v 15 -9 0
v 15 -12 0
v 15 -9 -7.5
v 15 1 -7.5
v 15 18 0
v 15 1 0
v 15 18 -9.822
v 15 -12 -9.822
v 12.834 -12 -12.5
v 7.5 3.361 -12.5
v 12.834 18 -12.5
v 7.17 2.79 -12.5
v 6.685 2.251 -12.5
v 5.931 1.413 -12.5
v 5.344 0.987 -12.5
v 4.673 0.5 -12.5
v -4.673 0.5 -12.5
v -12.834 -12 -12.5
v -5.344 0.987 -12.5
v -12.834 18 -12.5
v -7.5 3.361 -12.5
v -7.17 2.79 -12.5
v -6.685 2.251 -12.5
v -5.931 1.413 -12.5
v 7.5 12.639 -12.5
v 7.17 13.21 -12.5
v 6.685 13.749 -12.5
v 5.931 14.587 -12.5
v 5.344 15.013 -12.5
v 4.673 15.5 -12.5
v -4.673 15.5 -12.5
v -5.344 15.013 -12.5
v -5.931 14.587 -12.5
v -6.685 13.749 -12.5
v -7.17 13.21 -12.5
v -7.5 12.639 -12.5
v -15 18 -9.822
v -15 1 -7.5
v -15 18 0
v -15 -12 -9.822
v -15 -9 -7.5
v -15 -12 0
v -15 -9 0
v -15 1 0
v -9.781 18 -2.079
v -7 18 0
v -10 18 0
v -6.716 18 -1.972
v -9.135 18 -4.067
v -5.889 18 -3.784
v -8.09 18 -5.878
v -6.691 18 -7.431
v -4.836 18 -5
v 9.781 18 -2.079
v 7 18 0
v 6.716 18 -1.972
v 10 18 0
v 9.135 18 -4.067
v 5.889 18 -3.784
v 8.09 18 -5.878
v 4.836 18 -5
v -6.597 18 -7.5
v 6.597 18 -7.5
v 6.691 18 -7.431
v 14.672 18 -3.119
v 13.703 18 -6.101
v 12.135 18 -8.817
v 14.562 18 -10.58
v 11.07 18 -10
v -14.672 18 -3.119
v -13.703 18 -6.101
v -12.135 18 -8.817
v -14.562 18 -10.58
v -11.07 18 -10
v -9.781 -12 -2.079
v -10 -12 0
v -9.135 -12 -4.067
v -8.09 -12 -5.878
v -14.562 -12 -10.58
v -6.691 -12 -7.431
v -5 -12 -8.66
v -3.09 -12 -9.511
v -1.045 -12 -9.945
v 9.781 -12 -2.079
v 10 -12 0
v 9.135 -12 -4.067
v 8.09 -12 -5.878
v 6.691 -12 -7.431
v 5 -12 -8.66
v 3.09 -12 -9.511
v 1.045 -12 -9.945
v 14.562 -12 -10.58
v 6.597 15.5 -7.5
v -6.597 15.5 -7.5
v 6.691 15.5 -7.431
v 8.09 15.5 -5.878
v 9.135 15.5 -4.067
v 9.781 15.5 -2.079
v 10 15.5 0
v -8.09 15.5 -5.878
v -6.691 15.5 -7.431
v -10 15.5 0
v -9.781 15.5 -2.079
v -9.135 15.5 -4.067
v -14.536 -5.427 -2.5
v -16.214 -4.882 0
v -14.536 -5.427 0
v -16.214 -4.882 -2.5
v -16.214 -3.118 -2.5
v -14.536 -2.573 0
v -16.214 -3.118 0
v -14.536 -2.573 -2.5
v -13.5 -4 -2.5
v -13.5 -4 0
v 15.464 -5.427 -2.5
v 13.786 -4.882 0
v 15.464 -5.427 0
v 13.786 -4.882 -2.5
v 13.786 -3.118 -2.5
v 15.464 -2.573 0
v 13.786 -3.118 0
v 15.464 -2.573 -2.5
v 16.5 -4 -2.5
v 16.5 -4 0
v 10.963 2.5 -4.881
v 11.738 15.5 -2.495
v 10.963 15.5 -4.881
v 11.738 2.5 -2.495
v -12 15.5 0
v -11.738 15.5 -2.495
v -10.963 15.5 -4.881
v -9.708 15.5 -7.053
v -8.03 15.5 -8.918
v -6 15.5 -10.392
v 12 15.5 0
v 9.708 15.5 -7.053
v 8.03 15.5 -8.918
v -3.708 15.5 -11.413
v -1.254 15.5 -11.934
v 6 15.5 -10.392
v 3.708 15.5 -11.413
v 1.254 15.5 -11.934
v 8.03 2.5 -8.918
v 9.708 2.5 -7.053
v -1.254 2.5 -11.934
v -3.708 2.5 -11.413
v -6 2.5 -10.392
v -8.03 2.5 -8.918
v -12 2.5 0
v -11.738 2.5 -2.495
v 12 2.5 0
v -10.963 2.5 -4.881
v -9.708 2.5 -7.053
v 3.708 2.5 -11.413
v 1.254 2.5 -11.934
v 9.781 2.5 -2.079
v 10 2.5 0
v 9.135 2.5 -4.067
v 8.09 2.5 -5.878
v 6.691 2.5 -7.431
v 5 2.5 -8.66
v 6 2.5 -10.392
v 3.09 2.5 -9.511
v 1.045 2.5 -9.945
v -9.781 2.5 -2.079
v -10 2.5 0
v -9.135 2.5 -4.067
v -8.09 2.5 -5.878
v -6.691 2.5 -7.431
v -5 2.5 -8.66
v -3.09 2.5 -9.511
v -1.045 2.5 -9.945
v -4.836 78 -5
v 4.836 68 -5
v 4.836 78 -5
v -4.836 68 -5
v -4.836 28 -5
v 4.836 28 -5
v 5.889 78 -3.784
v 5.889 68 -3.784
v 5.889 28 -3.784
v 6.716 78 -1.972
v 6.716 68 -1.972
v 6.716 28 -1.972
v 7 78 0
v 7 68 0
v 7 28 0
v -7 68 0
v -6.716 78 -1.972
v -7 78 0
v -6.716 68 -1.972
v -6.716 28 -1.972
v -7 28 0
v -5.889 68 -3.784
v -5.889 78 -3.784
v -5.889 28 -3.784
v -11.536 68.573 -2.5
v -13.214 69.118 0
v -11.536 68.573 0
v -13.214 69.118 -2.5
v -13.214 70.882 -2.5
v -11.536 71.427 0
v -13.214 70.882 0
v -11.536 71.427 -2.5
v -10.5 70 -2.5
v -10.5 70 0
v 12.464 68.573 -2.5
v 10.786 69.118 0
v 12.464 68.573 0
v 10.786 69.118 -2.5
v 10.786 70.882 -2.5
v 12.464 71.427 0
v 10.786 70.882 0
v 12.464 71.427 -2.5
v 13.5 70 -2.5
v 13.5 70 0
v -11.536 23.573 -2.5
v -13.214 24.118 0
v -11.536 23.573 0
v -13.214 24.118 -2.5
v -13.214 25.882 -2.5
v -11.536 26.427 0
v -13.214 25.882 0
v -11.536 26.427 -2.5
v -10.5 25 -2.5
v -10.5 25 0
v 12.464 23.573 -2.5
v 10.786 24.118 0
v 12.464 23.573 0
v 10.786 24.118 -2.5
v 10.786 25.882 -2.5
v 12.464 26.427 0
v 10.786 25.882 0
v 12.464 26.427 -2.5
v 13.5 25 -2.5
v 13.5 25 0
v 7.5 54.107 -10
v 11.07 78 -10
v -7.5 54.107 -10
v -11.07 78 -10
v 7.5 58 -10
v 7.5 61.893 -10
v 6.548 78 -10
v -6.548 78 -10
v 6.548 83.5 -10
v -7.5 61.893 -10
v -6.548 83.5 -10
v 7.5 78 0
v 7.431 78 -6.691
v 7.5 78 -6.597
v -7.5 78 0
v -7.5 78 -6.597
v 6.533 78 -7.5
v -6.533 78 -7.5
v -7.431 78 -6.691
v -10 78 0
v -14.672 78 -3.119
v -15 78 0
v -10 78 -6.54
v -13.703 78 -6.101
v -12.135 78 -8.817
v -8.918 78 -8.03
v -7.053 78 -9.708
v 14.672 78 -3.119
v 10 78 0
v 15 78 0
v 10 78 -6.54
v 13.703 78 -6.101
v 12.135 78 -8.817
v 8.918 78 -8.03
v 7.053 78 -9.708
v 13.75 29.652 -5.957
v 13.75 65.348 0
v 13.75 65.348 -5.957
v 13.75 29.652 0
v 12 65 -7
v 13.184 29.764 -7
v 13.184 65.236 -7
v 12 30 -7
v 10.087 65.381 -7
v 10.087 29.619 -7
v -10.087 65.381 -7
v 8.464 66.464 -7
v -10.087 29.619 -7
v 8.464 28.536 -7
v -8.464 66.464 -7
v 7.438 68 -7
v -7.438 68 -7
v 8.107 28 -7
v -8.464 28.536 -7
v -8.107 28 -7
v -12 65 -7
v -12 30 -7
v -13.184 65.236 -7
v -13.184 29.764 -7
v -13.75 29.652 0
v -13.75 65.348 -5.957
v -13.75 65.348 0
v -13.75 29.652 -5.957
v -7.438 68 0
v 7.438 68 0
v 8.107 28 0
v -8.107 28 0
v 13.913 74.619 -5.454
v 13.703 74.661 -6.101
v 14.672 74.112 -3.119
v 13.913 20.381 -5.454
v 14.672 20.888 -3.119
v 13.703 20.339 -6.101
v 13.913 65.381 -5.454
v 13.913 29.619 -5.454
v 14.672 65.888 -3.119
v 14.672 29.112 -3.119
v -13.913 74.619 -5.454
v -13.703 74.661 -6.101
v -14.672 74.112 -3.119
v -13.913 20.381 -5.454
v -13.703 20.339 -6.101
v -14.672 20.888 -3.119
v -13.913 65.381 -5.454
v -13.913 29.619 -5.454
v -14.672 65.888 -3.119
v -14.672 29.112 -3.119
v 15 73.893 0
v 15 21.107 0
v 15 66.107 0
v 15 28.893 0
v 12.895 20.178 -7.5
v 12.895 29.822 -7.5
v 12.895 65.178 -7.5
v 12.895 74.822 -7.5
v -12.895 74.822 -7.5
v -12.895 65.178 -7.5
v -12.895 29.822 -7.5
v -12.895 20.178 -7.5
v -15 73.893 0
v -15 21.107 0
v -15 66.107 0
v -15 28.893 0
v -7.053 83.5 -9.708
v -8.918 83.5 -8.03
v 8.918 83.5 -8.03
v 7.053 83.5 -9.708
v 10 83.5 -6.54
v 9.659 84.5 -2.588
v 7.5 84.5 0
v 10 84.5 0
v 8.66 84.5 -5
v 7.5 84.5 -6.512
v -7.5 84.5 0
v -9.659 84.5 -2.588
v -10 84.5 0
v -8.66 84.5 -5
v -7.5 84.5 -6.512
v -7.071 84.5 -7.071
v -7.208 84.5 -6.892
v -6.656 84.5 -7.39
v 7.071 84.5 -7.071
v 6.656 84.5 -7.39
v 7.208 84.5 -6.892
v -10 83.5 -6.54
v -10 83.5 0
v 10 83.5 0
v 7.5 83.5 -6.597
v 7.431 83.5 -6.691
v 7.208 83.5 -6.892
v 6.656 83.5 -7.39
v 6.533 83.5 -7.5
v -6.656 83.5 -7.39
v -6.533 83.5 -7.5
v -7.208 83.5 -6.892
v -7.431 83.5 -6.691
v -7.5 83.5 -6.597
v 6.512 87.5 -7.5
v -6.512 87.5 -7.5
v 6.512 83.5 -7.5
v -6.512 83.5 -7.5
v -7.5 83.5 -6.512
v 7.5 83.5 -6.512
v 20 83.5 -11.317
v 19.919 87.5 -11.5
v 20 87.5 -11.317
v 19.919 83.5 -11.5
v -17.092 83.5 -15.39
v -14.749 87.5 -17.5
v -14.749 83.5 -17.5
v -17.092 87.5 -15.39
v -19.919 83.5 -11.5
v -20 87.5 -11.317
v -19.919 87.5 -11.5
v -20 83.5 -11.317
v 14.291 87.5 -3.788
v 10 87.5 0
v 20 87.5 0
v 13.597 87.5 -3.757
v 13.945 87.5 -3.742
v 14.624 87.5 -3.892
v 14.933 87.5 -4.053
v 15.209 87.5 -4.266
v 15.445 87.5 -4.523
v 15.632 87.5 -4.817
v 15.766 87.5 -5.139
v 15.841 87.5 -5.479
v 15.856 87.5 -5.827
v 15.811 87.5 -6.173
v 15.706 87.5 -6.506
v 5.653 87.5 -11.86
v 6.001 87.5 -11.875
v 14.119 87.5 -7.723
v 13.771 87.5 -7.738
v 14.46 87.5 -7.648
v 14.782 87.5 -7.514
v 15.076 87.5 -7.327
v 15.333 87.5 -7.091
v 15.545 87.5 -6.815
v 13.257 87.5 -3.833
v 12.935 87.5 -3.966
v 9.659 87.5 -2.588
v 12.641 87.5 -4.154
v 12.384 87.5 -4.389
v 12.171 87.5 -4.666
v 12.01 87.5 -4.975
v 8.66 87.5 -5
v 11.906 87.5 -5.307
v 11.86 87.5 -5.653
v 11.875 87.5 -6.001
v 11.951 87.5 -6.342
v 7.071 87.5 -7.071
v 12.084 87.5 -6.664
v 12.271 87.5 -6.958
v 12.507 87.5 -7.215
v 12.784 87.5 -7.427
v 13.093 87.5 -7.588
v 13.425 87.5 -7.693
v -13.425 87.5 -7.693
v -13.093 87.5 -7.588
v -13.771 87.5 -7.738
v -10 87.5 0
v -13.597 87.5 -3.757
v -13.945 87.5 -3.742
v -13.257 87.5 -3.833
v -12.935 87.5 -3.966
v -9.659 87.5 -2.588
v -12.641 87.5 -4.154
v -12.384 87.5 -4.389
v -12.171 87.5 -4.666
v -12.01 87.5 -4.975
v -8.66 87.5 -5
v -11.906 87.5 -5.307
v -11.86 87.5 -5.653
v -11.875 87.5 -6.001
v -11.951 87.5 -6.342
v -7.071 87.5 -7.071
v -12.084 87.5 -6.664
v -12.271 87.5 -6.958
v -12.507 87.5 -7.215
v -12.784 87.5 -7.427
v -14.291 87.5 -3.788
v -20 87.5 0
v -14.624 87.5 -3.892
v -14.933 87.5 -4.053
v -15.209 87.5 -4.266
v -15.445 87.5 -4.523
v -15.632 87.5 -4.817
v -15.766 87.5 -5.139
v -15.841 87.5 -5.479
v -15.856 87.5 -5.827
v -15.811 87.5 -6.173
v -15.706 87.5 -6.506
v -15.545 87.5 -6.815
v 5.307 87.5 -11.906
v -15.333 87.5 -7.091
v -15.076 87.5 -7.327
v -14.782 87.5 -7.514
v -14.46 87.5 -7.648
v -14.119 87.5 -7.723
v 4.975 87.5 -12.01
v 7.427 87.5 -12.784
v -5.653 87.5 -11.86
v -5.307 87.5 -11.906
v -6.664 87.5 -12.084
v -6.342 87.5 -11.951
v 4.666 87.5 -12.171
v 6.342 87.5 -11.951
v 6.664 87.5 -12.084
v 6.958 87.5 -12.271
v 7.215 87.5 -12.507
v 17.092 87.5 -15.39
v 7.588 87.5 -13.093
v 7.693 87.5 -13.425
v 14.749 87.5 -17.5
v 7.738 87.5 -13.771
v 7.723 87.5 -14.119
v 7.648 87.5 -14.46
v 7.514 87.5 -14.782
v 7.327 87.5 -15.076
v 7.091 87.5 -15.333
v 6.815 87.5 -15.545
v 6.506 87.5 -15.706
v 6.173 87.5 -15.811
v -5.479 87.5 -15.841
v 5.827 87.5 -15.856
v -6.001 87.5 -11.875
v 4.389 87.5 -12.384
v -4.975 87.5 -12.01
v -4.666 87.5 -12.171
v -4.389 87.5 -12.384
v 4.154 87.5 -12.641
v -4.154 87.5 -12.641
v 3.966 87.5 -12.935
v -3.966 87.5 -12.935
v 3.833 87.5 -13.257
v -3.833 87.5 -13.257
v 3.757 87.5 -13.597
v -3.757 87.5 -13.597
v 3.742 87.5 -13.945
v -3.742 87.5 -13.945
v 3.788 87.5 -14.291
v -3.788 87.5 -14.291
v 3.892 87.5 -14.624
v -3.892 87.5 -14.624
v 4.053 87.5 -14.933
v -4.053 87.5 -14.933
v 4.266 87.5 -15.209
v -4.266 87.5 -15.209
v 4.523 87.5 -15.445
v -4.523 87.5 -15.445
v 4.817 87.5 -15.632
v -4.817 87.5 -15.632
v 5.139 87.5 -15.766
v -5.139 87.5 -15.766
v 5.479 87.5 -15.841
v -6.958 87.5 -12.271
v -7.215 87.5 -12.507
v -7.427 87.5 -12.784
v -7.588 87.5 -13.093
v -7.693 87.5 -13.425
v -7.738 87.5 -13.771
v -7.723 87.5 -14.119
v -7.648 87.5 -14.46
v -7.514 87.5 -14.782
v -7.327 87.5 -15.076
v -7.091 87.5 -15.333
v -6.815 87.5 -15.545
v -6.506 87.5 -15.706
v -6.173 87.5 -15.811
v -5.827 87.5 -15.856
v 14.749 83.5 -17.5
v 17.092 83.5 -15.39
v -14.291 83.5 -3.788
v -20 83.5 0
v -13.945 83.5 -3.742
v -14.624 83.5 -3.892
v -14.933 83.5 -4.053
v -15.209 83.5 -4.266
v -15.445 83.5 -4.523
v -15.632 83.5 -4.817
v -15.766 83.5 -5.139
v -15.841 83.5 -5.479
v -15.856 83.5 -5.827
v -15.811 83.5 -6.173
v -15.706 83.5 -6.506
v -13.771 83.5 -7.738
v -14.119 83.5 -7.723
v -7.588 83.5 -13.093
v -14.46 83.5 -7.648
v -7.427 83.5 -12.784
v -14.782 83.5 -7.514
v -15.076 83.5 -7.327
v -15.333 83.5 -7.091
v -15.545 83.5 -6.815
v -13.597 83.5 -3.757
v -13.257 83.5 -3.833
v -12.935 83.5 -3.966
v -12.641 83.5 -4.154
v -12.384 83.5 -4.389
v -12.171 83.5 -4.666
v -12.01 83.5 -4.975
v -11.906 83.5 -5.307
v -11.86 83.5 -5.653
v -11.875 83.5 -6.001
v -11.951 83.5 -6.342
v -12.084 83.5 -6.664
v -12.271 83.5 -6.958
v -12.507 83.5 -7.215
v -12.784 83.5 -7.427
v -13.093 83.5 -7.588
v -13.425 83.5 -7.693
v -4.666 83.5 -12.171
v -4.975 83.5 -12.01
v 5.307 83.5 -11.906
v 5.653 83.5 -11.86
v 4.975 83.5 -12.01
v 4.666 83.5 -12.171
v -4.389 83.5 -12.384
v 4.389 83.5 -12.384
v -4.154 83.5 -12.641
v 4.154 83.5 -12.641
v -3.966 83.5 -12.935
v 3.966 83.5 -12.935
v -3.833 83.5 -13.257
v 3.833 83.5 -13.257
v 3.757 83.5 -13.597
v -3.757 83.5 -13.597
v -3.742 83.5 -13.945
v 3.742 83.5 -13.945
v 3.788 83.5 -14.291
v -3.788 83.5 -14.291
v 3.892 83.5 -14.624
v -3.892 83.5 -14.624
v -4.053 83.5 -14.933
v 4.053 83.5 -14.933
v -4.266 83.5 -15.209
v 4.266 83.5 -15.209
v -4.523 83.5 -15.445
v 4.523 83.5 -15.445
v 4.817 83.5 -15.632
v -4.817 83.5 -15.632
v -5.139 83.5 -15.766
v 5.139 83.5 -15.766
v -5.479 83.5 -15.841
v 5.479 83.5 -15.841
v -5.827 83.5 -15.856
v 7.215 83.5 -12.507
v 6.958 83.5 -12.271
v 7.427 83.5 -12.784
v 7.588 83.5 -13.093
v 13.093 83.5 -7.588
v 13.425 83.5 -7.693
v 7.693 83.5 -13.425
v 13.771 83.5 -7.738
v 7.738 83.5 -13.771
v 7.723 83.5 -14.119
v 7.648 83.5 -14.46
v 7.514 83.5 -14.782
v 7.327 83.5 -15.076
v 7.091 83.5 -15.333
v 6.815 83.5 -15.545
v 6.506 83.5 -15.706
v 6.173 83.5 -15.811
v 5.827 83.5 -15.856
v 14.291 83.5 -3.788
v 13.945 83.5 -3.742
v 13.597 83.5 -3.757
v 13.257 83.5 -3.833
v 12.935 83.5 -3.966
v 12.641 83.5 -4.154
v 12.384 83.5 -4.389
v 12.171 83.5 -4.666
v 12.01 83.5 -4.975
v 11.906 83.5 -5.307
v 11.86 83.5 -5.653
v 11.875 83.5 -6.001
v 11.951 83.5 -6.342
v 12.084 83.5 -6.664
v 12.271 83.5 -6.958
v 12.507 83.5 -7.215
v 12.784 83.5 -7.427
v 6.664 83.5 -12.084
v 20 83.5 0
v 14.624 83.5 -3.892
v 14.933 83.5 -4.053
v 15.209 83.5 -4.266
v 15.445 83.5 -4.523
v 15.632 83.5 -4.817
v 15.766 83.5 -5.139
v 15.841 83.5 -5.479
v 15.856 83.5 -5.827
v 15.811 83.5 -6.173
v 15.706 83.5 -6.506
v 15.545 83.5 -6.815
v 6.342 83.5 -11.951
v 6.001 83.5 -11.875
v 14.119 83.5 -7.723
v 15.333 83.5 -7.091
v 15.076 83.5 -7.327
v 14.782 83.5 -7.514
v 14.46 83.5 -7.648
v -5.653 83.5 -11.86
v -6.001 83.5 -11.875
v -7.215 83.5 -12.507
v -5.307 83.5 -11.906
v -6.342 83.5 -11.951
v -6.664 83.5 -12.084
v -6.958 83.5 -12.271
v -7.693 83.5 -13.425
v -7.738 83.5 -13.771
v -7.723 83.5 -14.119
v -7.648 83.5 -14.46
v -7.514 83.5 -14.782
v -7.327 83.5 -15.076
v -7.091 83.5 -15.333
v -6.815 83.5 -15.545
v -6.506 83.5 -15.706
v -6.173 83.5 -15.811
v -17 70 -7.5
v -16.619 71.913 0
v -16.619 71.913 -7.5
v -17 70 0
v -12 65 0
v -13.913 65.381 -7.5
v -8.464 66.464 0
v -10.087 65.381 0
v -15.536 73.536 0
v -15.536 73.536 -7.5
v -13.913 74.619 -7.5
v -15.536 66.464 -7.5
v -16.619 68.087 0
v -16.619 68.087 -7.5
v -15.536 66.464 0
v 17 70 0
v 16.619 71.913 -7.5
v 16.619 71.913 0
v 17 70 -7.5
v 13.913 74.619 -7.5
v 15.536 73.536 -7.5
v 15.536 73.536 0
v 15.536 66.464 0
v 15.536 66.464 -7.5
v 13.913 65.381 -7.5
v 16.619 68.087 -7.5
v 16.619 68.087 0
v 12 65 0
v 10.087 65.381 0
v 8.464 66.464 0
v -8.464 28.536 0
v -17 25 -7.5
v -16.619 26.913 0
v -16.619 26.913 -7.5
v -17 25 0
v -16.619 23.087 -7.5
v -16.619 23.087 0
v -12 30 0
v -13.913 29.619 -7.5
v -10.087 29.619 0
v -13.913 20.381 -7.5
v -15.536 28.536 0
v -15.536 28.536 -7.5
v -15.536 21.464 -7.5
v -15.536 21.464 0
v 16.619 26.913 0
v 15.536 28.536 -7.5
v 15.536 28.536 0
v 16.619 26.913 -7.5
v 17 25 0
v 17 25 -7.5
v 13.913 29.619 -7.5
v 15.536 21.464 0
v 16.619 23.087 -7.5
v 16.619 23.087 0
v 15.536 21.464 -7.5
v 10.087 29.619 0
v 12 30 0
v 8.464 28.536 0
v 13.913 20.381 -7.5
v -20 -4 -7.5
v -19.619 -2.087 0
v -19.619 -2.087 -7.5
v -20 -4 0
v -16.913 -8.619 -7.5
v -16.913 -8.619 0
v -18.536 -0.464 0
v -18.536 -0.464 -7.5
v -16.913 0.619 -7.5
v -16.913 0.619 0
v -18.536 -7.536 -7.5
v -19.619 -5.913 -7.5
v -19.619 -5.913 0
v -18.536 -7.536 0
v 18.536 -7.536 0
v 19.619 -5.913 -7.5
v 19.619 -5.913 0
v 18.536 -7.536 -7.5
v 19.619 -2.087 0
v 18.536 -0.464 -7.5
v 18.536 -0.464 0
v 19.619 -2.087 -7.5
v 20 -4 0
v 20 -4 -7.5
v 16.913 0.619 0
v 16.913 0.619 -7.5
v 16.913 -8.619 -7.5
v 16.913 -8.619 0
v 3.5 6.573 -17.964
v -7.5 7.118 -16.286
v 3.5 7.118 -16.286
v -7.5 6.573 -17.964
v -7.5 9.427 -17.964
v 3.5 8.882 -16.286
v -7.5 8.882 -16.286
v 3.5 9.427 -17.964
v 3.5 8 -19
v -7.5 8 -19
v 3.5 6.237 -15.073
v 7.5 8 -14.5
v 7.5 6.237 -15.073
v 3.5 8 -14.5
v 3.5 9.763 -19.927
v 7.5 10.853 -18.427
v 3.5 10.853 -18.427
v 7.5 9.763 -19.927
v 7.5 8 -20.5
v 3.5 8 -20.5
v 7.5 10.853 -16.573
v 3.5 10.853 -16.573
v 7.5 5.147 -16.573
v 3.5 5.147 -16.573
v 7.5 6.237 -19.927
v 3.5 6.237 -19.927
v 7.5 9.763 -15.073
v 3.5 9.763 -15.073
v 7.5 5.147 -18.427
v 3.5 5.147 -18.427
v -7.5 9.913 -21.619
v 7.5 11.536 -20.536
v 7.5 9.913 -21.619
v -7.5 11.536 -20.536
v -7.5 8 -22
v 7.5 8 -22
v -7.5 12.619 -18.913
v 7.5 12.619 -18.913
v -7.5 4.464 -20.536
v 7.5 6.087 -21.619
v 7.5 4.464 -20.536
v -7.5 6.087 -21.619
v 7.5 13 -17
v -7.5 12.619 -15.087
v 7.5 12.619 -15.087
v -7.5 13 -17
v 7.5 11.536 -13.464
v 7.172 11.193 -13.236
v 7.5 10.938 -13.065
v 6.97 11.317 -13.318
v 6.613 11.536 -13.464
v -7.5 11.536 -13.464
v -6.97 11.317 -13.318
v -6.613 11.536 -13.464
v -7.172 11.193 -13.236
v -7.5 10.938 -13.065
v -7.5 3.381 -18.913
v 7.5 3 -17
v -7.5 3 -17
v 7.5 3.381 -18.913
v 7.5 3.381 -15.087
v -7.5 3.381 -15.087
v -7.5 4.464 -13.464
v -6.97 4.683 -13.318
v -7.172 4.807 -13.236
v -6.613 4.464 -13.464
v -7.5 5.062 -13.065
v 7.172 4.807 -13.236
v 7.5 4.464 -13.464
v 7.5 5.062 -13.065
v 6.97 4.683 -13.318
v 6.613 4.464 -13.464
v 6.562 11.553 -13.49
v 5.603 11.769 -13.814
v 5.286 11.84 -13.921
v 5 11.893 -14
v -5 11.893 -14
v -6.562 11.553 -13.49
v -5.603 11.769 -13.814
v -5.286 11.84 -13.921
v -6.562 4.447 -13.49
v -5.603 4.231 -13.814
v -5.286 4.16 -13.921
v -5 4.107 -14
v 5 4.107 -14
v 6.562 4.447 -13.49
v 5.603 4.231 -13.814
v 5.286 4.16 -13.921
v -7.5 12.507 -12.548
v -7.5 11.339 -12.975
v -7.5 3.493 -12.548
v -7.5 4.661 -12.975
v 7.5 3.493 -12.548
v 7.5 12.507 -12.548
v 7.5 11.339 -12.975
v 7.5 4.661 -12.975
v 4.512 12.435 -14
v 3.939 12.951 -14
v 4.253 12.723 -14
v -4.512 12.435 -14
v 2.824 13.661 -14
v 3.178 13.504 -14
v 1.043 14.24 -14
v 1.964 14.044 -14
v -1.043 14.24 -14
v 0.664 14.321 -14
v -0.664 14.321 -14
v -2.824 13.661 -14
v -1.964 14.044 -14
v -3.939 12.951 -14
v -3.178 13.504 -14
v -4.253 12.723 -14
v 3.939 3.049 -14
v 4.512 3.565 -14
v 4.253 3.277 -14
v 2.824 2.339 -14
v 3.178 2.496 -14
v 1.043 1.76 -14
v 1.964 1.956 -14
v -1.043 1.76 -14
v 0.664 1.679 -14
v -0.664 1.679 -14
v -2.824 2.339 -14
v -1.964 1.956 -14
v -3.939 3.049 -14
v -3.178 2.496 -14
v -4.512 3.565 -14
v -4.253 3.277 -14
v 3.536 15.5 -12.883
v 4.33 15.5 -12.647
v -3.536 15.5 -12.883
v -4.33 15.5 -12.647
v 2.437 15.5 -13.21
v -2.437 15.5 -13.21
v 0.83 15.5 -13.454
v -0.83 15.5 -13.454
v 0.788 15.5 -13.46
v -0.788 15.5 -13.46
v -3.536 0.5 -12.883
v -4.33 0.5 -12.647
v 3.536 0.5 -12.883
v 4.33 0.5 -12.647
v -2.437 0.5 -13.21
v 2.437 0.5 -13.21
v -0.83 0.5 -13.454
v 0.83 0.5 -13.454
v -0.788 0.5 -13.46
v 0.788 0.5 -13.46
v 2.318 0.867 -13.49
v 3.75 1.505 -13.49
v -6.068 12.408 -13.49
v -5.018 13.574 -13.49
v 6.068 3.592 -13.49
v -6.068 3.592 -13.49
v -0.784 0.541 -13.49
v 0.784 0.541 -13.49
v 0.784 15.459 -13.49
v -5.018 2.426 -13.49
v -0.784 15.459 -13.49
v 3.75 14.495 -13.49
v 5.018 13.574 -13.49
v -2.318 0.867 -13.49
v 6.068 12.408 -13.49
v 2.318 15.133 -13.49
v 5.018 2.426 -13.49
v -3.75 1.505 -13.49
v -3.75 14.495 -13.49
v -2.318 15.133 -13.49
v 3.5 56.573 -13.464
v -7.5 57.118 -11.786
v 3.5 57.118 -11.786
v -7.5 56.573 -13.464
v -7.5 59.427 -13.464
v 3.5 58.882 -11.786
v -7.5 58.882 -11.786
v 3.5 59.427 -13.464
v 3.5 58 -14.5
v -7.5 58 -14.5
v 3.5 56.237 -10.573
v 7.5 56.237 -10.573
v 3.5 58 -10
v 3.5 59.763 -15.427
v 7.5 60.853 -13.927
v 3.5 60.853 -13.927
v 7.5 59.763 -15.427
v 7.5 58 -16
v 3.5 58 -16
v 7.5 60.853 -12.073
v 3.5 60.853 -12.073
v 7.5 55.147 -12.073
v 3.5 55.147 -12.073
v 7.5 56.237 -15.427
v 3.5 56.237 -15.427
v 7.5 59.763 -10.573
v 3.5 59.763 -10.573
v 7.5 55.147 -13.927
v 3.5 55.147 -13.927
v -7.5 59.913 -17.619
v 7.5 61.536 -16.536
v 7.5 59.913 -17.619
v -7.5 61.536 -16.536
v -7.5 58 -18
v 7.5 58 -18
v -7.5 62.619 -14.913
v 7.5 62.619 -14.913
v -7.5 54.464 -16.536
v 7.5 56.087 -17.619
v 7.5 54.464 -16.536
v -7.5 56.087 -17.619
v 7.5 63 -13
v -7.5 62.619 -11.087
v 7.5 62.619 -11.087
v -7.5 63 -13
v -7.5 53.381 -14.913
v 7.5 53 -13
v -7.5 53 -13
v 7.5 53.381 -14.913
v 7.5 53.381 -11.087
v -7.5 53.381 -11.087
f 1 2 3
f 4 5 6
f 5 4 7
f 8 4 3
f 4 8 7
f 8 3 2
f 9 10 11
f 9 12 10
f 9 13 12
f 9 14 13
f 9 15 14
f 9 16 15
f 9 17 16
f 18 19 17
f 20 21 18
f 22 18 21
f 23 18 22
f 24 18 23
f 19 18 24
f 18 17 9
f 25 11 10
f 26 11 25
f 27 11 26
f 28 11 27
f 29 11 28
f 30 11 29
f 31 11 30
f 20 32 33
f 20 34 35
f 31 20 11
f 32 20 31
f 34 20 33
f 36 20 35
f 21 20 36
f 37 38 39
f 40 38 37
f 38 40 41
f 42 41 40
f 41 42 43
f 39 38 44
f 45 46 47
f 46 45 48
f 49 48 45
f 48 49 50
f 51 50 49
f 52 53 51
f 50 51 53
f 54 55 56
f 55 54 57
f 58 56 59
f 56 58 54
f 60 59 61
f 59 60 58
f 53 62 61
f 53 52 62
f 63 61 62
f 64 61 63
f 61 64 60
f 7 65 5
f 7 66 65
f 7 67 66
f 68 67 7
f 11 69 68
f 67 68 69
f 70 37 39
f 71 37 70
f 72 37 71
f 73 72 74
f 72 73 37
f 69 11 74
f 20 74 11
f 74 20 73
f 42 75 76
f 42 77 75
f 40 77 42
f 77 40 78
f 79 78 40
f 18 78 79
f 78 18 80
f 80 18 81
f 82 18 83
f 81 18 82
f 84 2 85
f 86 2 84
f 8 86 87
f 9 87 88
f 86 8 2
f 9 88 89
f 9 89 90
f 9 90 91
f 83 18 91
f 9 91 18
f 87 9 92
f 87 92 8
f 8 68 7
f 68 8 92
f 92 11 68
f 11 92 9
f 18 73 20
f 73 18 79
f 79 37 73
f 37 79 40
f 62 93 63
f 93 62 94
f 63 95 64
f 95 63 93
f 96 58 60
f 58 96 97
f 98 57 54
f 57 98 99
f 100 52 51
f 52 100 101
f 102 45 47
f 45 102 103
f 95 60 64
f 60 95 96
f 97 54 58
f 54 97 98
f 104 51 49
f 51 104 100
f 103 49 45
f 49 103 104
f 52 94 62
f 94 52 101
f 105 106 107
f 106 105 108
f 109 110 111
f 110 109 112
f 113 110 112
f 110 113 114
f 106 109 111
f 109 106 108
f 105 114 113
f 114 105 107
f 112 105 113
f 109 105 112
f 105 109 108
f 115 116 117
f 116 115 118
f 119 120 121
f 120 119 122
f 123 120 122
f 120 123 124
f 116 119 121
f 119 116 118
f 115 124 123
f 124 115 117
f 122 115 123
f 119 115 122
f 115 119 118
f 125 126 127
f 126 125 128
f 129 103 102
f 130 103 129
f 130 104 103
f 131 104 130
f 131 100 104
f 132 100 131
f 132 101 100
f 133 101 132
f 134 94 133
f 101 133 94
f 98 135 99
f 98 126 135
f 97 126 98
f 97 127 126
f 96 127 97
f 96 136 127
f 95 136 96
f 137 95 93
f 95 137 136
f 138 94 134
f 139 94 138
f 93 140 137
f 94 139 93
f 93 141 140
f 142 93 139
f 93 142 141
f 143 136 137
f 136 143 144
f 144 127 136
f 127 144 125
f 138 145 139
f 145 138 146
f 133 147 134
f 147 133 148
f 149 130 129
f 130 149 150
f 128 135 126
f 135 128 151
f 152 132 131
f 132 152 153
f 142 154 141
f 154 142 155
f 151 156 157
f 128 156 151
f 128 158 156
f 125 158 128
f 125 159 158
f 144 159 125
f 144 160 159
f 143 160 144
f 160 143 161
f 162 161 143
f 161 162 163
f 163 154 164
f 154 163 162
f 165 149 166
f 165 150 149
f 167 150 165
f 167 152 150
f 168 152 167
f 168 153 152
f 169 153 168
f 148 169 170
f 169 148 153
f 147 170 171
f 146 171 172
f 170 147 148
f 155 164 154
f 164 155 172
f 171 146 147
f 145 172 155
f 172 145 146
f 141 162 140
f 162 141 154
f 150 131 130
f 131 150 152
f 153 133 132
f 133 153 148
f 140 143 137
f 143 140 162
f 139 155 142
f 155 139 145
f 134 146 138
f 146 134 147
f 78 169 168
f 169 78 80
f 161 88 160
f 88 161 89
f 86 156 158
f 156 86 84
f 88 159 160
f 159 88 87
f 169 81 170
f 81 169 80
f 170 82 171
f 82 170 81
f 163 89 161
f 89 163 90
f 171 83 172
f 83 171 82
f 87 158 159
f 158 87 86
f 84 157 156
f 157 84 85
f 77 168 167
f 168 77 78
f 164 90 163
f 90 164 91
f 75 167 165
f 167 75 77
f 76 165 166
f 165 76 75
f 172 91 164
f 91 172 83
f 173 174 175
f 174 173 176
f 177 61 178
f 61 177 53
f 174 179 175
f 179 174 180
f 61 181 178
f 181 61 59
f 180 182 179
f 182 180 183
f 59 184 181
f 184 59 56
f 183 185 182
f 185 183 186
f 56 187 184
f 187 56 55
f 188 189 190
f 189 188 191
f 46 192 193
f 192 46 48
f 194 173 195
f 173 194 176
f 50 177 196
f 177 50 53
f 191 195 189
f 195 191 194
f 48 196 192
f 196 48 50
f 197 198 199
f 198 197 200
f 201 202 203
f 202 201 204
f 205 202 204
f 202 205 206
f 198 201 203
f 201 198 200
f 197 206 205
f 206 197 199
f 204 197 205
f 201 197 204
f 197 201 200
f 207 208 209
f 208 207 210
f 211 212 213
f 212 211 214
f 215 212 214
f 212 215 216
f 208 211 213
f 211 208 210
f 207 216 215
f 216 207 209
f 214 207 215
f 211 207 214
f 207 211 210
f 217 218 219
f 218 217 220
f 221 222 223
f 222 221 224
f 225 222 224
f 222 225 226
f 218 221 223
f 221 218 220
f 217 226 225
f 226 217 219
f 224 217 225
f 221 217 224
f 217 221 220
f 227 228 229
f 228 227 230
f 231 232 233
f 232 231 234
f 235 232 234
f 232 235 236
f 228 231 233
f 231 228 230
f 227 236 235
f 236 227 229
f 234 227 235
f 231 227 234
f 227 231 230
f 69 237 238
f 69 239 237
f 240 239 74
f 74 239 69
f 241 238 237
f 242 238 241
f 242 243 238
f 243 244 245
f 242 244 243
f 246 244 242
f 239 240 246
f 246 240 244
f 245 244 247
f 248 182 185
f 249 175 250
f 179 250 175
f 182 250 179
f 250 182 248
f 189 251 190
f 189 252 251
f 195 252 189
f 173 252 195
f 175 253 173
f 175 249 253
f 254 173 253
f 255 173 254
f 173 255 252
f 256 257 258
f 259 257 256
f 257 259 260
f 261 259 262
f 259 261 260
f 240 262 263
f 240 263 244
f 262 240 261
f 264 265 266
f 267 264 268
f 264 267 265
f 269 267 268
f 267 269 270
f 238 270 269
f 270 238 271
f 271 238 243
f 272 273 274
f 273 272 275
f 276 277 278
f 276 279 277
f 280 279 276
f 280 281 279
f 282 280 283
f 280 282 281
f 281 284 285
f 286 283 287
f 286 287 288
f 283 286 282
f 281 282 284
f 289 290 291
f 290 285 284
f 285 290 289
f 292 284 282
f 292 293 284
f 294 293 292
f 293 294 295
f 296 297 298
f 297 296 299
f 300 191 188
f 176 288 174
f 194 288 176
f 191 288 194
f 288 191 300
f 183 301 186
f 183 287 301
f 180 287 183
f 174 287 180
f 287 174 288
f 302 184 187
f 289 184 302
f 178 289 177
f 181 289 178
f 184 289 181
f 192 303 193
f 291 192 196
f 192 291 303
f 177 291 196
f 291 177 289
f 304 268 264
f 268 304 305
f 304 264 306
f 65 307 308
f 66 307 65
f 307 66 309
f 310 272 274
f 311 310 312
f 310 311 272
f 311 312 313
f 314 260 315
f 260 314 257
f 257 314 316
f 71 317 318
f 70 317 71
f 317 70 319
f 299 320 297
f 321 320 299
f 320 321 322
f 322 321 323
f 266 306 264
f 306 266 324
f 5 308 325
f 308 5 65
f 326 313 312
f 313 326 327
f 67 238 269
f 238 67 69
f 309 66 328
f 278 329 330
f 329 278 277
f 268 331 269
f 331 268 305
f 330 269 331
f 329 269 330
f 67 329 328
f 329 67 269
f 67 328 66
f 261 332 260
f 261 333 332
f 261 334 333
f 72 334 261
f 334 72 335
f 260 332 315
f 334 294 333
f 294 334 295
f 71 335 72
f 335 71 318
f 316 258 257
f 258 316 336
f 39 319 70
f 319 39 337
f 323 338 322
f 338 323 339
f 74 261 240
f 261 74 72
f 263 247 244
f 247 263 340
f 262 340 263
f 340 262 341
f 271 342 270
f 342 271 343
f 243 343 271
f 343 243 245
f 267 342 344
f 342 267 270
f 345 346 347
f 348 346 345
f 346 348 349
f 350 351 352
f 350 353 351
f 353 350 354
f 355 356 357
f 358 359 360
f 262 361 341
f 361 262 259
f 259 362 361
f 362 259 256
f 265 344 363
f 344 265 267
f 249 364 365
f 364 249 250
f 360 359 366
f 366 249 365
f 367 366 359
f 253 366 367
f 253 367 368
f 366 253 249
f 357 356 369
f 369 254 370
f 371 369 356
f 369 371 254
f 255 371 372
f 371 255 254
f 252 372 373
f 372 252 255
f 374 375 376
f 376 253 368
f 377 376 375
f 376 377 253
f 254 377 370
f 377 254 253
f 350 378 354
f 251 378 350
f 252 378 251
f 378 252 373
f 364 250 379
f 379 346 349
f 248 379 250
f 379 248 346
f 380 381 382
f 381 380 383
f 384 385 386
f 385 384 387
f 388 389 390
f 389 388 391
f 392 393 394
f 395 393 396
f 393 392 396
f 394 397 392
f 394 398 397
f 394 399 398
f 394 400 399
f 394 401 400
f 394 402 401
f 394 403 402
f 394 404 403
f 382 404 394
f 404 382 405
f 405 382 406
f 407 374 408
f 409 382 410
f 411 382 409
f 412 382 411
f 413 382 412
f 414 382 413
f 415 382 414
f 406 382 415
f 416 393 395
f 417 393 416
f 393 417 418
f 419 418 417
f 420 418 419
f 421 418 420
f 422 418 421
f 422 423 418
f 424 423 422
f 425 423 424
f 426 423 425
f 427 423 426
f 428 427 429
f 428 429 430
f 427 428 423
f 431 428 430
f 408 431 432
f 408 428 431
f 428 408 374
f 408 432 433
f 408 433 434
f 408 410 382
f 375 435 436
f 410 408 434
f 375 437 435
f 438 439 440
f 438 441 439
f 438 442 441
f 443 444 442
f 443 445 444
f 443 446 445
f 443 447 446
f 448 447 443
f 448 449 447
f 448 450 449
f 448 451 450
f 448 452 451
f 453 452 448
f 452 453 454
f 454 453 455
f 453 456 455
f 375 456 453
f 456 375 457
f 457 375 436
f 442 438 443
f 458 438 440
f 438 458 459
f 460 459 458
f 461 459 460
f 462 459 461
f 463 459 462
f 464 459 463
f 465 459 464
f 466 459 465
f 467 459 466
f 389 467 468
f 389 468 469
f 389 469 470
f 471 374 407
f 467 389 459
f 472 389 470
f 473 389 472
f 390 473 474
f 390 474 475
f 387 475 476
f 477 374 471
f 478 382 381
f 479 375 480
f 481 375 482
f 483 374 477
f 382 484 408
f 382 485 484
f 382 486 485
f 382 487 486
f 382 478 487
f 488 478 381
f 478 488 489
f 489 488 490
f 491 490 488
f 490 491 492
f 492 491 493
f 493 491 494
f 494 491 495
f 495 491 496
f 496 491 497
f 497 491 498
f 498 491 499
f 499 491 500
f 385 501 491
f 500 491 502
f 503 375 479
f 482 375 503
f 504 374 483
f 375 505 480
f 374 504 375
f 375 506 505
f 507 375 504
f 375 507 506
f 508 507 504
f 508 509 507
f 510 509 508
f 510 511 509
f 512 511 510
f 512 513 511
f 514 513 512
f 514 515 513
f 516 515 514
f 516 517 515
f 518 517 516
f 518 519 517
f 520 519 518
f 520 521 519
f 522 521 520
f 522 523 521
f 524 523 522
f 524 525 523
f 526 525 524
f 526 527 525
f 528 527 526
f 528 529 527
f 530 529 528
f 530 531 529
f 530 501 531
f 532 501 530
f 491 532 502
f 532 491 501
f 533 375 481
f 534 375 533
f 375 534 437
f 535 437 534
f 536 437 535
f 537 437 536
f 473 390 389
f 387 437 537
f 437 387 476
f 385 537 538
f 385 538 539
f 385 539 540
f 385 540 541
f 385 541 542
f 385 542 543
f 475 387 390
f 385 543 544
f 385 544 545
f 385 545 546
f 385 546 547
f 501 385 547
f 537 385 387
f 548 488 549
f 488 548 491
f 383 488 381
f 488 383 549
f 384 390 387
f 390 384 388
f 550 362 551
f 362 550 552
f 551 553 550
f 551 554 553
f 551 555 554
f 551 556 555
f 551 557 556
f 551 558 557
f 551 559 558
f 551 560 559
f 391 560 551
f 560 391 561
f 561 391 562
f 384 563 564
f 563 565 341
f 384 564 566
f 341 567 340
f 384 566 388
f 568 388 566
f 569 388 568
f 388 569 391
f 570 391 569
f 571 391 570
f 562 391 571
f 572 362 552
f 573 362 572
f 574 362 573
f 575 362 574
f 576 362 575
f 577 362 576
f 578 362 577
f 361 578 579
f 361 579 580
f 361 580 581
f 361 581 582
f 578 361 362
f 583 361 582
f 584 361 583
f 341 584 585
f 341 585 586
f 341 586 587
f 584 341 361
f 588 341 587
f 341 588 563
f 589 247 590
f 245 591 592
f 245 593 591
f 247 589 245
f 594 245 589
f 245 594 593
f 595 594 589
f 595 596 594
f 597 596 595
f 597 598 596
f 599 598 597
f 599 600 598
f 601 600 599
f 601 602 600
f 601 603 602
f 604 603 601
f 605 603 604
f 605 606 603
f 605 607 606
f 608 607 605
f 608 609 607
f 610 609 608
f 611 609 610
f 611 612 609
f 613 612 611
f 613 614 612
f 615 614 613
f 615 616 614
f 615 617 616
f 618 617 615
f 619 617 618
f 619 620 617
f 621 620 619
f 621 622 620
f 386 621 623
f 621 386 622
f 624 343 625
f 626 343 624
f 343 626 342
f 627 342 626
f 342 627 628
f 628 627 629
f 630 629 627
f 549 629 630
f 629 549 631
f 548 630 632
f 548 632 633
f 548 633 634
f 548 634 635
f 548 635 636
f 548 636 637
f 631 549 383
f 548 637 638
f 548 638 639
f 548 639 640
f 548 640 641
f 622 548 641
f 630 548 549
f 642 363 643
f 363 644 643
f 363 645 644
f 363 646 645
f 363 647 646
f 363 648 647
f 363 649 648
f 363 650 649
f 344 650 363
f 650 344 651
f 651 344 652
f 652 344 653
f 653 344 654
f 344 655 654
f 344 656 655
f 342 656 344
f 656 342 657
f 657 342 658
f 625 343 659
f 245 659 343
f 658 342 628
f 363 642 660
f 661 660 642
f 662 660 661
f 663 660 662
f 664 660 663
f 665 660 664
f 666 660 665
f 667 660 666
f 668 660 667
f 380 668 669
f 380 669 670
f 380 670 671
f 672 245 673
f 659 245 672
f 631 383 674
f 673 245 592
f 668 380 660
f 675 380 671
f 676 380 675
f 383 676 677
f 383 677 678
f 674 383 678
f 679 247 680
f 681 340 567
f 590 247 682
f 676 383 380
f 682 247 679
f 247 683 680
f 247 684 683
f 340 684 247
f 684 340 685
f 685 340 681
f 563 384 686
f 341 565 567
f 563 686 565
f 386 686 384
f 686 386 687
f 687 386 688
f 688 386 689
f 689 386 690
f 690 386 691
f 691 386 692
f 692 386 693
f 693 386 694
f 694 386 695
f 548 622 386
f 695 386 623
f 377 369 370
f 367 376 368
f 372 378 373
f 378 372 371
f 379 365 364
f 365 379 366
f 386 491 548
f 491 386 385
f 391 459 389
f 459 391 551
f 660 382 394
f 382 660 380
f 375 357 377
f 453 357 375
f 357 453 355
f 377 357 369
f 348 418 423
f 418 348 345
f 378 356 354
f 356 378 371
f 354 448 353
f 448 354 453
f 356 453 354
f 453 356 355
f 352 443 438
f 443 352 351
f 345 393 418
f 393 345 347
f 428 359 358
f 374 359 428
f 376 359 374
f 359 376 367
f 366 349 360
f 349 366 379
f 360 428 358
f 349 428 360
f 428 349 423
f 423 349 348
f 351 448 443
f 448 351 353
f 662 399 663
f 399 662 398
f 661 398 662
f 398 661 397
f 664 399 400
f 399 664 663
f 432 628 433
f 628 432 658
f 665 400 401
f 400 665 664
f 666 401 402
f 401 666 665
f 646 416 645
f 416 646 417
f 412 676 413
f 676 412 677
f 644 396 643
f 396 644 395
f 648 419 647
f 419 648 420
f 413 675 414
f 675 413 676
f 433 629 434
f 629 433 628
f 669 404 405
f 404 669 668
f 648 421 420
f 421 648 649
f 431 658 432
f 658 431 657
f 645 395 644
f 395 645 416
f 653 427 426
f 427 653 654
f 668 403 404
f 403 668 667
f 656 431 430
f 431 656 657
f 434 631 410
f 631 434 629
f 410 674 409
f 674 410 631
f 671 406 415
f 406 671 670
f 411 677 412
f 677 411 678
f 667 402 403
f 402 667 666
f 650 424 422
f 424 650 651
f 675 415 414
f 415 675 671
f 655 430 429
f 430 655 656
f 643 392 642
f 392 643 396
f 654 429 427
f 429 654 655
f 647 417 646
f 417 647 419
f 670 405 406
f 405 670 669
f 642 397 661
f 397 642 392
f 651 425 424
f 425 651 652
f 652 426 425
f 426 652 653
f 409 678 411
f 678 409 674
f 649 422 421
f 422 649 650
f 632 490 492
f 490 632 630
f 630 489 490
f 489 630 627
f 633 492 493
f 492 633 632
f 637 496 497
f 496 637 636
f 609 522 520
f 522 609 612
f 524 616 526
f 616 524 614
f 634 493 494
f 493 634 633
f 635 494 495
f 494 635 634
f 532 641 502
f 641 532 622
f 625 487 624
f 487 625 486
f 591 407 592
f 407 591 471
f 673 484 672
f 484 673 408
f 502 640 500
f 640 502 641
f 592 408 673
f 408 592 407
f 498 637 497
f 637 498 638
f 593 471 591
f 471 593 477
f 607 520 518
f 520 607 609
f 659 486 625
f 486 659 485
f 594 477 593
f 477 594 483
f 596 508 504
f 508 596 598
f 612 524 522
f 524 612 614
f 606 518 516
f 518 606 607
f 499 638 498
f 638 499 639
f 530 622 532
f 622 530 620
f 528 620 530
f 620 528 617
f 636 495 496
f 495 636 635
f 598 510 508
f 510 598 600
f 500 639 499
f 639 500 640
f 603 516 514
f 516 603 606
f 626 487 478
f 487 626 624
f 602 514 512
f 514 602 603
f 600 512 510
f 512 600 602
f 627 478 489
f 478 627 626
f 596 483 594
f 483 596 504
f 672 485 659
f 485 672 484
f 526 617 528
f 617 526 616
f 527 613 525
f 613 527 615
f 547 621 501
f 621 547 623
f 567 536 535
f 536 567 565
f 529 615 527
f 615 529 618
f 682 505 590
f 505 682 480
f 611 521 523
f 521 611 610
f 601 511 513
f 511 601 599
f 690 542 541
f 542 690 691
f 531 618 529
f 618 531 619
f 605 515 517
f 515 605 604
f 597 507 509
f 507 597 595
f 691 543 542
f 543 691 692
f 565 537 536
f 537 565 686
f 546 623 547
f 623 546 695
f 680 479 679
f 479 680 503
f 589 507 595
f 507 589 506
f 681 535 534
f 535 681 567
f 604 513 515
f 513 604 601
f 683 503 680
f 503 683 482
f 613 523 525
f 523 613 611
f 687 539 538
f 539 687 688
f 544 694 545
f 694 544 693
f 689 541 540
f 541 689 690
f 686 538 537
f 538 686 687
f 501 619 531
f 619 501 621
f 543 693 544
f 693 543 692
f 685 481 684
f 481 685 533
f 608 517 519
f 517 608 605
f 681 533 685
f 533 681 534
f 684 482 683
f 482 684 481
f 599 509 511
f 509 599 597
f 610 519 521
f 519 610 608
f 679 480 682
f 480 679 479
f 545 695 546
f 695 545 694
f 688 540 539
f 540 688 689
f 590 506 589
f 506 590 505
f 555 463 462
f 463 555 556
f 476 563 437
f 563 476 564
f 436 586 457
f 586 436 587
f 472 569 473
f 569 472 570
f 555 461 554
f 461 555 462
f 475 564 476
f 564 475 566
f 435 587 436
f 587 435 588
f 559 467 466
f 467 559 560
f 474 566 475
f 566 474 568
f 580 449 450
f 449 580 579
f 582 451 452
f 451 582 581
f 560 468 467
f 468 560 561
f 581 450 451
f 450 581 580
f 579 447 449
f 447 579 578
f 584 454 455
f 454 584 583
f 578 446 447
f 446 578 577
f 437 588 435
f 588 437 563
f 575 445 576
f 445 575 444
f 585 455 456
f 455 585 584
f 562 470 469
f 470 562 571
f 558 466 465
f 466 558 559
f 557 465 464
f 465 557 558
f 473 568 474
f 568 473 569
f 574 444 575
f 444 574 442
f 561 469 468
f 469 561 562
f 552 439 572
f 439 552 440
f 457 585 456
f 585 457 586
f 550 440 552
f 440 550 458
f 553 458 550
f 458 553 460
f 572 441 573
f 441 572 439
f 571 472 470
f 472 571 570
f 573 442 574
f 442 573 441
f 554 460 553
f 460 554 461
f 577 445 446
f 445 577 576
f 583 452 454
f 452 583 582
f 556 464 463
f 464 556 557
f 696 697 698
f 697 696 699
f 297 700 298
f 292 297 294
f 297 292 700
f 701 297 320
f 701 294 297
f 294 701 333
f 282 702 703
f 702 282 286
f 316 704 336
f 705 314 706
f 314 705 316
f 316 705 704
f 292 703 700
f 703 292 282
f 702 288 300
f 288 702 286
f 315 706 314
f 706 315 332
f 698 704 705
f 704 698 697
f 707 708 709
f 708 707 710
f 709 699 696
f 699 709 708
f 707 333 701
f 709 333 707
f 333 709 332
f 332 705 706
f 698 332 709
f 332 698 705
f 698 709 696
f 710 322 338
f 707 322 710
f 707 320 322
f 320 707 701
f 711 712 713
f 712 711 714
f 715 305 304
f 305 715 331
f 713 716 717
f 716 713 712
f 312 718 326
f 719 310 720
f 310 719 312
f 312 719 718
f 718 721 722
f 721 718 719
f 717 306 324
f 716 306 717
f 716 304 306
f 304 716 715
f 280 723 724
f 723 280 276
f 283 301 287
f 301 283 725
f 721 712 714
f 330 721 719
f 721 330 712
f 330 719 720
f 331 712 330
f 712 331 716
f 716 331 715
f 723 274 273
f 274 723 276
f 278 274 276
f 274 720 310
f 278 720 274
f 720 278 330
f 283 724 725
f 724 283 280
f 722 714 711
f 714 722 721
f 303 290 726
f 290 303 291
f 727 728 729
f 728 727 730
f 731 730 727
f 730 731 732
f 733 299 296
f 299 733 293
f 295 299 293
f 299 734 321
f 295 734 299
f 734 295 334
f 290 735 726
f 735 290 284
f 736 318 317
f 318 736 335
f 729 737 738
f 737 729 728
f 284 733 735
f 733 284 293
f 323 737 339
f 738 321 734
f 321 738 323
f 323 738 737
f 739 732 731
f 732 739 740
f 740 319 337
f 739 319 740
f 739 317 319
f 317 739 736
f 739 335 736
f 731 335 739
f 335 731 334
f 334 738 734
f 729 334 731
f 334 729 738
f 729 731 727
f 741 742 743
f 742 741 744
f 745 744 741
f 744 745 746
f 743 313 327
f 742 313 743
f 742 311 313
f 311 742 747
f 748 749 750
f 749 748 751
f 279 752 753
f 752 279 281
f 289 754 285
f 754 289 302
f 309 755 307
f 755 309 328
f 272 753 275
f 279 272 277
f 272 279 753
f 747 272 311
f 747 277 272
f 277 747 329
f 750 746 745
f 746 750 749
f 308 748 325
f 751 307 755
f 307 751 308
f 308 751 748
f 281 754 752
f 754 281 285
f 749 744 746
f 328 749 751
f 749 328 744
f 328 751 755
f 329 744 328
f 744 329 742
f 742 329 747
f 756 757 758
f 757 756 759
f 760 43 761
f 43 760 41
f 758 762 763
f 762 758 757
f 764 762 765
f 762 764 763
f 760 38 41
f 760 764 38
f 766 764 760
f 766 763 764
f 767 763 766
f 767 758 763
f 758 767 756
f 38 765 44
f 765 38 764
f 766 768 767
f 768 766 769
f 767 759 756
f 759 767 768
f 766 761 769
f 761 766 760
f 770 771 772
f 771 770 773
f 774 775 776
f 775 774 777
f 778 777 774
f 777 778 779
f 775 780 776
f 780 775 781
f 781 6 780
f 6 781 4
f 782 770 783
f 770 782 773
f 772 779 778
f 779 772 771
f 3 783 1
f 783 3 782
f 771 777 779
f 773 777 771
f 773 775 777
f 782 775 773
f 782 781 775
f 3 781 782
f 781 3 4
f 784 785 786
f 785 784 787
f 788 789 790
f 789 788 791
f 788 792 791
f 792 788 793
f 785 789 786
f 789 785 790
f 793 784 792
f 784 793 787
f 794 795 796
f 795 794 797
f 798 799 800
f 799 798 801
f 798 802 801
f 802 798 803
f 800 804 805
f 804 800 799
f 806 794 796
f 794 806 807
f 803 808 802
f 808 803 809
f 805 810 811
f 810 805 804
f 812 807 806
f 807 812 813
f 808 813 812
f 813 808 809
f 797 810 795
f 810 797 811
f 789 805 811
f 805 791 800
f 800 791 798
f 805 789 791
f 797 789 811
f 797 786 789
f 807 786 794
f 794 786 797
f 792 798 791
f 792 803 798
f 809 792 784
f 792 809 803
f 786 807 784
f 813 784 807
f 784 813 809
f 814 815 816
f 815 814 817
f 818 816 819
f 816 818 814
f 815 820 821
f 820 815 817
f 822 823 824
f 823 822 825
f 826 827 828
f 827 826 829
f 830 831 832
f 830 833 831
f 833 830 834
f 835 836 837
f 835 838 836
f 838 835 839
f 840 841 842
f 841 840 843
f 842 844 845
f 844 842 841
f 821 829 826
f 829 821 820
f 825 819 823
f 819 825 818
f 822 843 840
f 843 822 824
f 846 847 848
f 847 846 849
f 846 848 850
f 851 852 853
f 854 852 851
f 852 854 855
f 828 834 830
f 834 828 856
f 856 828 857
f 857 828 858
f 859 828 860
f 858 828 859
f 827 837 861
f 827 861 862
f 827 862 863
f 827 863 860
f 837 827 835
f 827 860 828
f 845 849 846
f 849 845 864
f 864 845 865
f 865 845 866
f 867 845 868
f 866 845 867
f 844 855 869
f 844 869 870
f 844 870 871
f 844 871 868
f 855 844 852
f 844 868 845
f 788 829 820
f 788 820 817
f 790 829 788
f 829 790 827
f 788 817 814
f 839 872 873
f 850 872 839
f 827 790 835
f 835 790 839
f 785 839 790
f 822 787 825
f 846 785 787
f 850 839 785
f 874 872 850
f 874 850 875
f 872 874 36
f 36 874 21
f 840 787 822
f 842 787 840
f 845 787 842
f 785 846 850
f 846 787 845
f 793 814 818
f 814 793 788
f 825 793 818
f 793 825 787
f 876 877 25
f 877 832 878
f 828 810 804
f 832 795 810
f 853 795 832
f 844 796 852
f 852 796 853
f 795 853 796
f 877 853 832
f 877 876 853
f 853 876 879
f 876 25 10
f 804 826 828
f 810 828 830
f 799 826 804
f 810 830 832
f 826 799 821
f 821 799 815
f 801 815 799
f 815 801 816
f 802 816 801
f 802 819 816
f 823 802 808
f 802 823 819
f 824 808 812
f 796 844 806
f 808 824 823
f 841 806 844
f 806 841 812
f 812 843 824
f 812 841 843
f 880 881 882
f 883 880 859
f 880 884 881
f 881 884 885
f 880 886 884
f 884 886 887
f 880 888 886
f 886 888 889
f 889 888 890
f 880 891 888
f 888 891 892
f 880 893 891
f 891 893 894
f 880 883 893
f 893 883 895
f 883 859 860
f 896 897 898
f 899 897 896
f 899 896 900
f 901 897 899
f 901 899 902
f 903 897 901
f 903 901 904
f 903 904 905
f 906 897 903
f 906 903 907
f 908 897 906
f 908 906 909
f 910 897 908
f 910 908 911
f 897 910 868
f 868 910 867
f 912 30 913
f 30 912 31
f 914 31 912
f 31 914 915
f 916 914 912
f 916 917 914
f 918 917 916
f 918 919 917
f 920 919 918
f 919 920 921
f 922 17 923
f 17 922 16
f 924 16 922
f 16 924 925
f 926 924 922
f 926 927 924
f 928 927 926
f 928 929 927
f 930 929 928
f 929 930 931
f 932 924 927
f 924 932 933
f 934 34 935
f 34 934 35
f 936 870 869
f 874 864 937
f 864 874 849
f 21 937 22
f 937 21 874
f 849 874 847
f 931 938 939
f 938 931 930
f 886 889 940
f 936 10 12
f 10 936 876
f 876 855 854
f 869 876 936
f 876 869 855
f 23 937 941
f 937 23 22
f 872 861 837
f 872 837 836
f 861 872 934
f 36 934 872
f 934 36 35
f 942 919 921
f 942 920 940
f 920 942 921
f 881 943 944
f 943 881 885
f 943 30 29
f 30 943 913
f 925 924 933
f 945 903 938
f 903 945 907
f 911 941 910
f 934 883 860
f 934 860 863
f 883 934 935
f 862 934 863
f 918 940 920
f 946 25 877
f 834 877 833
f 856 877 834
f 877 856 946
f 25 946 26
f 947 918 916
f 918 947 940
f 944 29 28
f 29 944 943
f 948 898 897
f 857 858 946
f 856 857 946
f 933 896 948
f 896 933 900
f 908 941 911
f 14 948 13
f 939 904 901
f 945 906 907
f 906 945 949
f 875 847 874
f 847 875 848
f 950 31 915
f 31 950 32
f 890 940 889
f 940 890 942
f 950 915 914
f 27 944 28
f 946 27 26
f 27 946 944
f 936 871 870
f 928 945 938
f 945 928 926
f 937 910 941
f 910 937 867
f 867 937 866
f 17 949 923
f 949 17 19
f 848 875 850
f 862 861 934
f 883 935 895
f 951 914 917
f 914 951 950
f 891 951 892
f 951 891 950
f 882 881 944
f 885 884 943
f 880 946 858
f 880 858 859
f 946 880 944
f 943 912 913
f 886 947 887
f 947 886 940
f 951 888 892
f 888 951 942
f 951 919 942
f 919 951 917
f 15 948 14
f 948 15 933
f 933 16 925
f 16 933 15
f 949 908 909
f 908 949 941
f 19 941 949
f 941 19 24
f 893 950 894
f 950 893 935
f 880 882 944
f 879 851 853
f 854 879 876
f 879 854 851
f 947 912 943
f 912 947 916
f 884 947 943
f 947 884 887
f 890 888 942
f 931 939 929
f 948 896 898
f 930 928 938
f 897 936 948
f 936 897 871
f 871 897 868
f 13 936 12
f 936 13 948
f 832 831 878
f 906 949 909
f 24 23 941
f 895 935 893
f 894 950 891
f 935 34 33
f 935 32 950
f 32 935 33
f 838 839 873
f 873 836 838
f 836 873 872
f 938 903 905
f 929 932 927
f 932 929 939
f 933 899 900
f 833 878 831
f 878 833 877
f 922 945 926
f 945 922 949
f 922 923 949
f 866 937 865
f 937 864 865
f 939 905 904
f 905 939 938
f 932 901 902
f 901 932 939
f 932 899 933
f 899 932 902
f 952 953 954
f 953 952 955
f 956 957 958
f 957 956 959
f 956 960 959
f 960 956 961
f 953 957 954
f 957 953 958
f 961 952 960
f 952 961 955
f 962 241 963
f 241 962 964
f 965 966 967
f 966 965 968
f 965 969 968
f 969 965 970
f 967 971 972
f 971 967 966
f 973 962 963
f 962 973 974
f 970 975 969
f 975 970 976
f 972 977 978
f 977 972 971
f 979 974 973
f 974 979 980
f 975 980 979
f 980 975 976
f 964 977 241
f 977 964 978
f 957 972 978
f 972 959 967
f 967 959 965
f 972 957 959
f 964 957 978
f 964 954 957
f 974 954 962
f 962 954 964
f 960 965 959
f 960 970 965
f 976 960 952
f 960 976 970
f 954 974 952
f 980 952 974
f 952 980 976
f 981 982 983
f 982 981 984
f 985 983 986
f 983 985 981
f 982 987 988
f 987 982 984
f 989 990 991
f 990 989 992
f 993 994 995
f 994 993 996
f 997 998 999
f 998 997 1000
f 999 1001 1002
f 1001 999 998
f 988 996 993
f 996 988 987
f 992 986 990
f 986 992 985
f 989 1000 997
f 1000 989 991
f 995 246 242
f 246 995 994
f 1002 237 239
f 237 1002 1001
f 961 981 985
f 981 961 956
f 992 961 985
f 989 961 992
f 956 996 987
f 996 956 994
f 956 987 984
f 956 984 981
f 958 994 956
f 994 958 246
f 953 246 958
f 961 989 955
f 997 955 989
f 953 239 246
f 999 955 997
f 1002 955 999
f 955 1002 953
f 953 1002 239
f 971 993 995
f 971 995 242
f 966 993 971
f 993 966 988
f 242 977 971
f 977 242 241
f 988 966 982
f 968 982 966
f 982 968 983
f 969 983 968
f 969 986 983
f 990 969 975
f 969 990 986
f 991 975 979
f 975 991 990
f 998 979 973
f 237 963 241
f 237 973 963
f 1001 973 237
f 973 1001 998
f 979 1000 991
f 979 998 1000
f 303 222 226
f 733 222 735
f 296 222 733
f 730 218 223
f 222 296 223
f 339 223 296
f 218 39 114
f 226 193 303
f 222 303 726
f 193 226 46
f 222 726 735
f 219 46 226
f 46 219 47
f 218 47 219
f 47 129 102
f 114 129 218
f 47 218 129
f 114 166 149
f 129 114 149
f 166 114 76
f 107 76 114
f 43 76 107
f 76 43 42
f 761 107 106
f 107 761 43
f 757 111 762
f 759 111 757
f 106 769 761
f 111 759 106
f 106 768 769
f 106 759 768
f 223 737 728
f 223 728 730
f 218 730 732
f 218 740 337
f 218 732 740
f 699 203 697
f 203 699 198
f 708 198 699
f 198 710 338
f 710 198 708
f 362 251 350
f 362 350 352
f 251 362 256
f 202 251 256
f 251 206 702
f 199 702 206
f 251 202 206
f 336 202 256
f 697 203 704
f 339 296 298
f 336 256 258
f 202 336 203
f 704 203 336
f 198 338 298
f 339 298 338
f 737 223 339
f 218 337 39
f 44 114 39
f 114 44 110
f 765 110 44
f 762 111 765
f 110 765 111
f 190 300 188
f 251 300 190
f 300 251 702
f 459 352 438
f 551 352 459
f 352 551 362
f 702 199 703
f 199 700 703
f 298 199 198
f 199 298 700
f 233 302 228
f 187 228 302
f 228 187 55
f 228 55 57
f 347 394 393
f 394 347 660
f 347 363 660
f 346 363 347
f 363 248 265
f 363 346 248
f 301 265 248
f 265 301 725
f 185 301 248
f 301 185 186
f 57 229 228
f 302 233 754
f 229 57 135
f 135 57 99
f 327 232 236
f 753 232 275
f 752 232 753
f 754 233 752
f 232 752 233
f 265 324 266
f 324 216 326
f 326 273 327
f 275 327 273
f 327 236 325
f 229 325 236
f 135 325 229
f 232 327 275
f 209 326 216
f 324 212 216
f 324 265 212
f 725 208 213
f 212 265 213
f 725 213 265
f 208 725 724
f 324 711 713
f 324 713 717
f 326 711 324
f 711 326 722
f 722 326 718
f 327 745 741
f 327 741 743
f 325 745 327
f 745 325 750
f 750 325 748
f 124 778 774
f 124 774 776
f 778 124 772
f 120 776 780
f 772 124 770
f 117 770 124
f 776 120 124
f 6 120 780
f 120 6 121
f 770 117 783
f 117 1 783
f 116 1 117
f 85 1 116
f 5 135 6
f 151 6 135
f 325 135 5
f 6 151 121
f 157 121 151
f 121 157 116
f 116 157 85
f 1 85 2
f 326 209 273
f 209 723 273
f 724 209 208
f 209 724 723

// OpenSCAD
// file: std_mechanical_object_flange3.scad
module flangeBody(){
	difference(){
		//tubeBody
		intersection(){
			translate([5,0,0]) rotate([0,90,0]) cylinder(h=12,r=12,center=true);
			translate([5,0,0]) cube(size=[20,20,20],center=true);
		}
		//throat
		intersection(){
			translate([5,0,0]) rotate([0,90,0]) cylinder(h=13,r=10,center=true);
			translate([5,0,0]) cube(size=[15,15,15],center=true);
		}
	}
}

module flangeFace(){
	difference(){
		union(){
			difference(){
				//flange
				intersection(){
					translate([12,0,0]) rotate([0,90,0]) cylinder(r=23,h=4,center=true);
					translate([12,0,0]) cube(size=[10,40,35],center=true);
				}
				//flangeThroat
				intersection(){
					translate([12,0,0]) rotate([0,90,0]) cylinder(r=10,h=5,$fn=24,center=true);
					translate([12,0,0]) cube(size=[10,20,15],center=true);
				}
			}
		}
		//tubeMountingHoles
		rotate([22.5,0,0]){
			for ( v = [0 : 8] ){
				rotate( v * 360 / 8, [1, 0, 0]){
					translate([12, 15, 0]){
						rotate([0,90,0]){
							cylinder(r=2,h=5,$fn=36,center=true);
						}
					}
				}
			}
		}
	}
}

module flange(){
	union(){
		flangeBody();
		flangeFace();
	}
}

flange();
// main file
use <std_mechanical_object_flange3.scad>

module objectiveMount(){	
	union(){
	difference(){
		//mainBody
		intersection(){
			translate([0,3,0]) color([0,.6,.5]) cube(size=[30,30,25],center=true);
			translate([0,3,0]) rotate([90,0,0]) cylinder(r=18,h=35,center=true);
		}
		//lensHole
		translate([0,9,0]) rotate([90,0,0]) cylinder(h=13,r=12,center=true);
		translate([0,-6,0]) rotate([90,0,0]) cylinder(h=18,r=10,center=true);
		intersection(){
			translate([0,14,0]) cube(size=[20,10,15],center=true);
			translate([0,15,0]) rotate([90,0,0]) cylinder(r=10,h=10,center=true);
		}
		translate([-15,-4,0]) screwHoleInner();
		translate([15,-4,0]) screwHoleInner();
	}
	color([0.6,0.84,0.64]){
	union(){
		intersection(){
			difference(){
				translate([0,48,0]) cube(size=[30,60,20],center=true);
				intersection(){
					translate([0,48,0]) cube(size=[28,61,10],center=true);
					translate([0,48,0]) rotate([90,0,0]) cylinder(r=7,h=62,center=true);
				}
				translate([0,48,0]) rotate([0,0,0]) cube(size=[27.5,40,14],center=true);
				//mainScrewHoles
				translate([-12,70,0]) screwHoleInner();
				translate([12,70,0]) screwHoleInner();
				translate([-12,25,0]) screwHoleInner();
				translate([12,25,0]) screwHoleInner();
			}
			translate([0,48,0]) rotate([90,0,0]) cylinder(r=15,h=62,center=true);
		}
		translate([0,73.5,0]){
			rotate([0,0,90]){
				flange();
			}
		}
	}	
	}
	//mainScrewHoles
	union(){
		difference(){
			translate([-12,70,0])  screwHoleOuter();
			translate([-12,70,0])  screwHoleInner();
		}
	}
	union(){
		difference(){
			translate([12,70,0]) screwHoleOuter();
			translate([12,70,0]) screwHoleInner();
		}
	}
	union(){
		difference(){
			translate([-12,25,0]) screwHoleOuter();
			translate([-12,25,0]) screwHoleInner();
		}
	}
	union(){
		difference(){
			translate([12,25,0]) screwHoleOuter();
			translate([12,25,0]) screwHoleInner();
		}
	}
	union(){
		difference(){
			translate([-15,-4,0]) screwHoleOuter();
			translate([-15,-4,0]) screwHoleInner();
		}
	}
	union(){
		difference(){
			translate([15,-4,0]) screwHoleOuter();
			translate([15,-4,0]) screwHoleInner();
		}
	}
	//sideScrewHoles
	union(){
		rotate([0,90,0]){
			difference(){
				translate([-17,8,0]) screwHoleOuter();
				translate([-17,8,0]) screwHoleInner2();
			}
		}
		translate([0,8,13]){
			intersection(){
					color([0,0.7,0.4]) cube(size=[15,15,2],center=true);
				translate([0,0,-12.5]){
					color([0,0.7,1]) sphere(r=15,center=true);
				}
			}
		}
	}
	union(){
		rotate([0,90,0]){
			difference(){
				translate([17,8,0]) screwHoleOuter();
				translate([17.5,8,0]) screwHoleInner2();
			}	
		}
		translate([0,8,-13]){
			intersection(){
				color([0,0.7,0.4]) cube(size=[15,15,2],center=true);
				translate([0,0,12.5]){
				color([0,0.7,1]) sphere(r=15,center=true);
				}
			}
		}
	}
	union(){
		rotate([0,90,0]){
			difference(){
				translate([-13,58,0]) screwHoleOuter();
				translate([-13,58,0]) screwHoleInner2();
			}		
		}
	}
	union(){
		rotate([0,90,0]){
			difference(){
				translate([13,58,0]) screwHoleOuter();
				translate([13,58,0]) screwHoleInner2();
			}
		}
	}
	}
}

module screwHoleOuter(){
		cylinder(r=5,h=15,center=true);
}

module screwHoleInner(){
	union(){
		translate([0,0,5]) cylinder(r=1.5,h=15,center=true);
		translate([0,0,11]) cylinder(r=3,h=15,center=true);
	}
}
module screwHoleInner2(){
	union(){
		translate([0,0,5]) cylinder(r=1.5,h=35,center=true);
		translate([0,0,11]) cylinder(r=3,h=15,center=true);
	}
}

translate([0,0,0]){
	difference(){
		objectiveMount();
		//chopBottom
		translate([0,30,15]) cube([100,150,30],center=true);
	}
}
